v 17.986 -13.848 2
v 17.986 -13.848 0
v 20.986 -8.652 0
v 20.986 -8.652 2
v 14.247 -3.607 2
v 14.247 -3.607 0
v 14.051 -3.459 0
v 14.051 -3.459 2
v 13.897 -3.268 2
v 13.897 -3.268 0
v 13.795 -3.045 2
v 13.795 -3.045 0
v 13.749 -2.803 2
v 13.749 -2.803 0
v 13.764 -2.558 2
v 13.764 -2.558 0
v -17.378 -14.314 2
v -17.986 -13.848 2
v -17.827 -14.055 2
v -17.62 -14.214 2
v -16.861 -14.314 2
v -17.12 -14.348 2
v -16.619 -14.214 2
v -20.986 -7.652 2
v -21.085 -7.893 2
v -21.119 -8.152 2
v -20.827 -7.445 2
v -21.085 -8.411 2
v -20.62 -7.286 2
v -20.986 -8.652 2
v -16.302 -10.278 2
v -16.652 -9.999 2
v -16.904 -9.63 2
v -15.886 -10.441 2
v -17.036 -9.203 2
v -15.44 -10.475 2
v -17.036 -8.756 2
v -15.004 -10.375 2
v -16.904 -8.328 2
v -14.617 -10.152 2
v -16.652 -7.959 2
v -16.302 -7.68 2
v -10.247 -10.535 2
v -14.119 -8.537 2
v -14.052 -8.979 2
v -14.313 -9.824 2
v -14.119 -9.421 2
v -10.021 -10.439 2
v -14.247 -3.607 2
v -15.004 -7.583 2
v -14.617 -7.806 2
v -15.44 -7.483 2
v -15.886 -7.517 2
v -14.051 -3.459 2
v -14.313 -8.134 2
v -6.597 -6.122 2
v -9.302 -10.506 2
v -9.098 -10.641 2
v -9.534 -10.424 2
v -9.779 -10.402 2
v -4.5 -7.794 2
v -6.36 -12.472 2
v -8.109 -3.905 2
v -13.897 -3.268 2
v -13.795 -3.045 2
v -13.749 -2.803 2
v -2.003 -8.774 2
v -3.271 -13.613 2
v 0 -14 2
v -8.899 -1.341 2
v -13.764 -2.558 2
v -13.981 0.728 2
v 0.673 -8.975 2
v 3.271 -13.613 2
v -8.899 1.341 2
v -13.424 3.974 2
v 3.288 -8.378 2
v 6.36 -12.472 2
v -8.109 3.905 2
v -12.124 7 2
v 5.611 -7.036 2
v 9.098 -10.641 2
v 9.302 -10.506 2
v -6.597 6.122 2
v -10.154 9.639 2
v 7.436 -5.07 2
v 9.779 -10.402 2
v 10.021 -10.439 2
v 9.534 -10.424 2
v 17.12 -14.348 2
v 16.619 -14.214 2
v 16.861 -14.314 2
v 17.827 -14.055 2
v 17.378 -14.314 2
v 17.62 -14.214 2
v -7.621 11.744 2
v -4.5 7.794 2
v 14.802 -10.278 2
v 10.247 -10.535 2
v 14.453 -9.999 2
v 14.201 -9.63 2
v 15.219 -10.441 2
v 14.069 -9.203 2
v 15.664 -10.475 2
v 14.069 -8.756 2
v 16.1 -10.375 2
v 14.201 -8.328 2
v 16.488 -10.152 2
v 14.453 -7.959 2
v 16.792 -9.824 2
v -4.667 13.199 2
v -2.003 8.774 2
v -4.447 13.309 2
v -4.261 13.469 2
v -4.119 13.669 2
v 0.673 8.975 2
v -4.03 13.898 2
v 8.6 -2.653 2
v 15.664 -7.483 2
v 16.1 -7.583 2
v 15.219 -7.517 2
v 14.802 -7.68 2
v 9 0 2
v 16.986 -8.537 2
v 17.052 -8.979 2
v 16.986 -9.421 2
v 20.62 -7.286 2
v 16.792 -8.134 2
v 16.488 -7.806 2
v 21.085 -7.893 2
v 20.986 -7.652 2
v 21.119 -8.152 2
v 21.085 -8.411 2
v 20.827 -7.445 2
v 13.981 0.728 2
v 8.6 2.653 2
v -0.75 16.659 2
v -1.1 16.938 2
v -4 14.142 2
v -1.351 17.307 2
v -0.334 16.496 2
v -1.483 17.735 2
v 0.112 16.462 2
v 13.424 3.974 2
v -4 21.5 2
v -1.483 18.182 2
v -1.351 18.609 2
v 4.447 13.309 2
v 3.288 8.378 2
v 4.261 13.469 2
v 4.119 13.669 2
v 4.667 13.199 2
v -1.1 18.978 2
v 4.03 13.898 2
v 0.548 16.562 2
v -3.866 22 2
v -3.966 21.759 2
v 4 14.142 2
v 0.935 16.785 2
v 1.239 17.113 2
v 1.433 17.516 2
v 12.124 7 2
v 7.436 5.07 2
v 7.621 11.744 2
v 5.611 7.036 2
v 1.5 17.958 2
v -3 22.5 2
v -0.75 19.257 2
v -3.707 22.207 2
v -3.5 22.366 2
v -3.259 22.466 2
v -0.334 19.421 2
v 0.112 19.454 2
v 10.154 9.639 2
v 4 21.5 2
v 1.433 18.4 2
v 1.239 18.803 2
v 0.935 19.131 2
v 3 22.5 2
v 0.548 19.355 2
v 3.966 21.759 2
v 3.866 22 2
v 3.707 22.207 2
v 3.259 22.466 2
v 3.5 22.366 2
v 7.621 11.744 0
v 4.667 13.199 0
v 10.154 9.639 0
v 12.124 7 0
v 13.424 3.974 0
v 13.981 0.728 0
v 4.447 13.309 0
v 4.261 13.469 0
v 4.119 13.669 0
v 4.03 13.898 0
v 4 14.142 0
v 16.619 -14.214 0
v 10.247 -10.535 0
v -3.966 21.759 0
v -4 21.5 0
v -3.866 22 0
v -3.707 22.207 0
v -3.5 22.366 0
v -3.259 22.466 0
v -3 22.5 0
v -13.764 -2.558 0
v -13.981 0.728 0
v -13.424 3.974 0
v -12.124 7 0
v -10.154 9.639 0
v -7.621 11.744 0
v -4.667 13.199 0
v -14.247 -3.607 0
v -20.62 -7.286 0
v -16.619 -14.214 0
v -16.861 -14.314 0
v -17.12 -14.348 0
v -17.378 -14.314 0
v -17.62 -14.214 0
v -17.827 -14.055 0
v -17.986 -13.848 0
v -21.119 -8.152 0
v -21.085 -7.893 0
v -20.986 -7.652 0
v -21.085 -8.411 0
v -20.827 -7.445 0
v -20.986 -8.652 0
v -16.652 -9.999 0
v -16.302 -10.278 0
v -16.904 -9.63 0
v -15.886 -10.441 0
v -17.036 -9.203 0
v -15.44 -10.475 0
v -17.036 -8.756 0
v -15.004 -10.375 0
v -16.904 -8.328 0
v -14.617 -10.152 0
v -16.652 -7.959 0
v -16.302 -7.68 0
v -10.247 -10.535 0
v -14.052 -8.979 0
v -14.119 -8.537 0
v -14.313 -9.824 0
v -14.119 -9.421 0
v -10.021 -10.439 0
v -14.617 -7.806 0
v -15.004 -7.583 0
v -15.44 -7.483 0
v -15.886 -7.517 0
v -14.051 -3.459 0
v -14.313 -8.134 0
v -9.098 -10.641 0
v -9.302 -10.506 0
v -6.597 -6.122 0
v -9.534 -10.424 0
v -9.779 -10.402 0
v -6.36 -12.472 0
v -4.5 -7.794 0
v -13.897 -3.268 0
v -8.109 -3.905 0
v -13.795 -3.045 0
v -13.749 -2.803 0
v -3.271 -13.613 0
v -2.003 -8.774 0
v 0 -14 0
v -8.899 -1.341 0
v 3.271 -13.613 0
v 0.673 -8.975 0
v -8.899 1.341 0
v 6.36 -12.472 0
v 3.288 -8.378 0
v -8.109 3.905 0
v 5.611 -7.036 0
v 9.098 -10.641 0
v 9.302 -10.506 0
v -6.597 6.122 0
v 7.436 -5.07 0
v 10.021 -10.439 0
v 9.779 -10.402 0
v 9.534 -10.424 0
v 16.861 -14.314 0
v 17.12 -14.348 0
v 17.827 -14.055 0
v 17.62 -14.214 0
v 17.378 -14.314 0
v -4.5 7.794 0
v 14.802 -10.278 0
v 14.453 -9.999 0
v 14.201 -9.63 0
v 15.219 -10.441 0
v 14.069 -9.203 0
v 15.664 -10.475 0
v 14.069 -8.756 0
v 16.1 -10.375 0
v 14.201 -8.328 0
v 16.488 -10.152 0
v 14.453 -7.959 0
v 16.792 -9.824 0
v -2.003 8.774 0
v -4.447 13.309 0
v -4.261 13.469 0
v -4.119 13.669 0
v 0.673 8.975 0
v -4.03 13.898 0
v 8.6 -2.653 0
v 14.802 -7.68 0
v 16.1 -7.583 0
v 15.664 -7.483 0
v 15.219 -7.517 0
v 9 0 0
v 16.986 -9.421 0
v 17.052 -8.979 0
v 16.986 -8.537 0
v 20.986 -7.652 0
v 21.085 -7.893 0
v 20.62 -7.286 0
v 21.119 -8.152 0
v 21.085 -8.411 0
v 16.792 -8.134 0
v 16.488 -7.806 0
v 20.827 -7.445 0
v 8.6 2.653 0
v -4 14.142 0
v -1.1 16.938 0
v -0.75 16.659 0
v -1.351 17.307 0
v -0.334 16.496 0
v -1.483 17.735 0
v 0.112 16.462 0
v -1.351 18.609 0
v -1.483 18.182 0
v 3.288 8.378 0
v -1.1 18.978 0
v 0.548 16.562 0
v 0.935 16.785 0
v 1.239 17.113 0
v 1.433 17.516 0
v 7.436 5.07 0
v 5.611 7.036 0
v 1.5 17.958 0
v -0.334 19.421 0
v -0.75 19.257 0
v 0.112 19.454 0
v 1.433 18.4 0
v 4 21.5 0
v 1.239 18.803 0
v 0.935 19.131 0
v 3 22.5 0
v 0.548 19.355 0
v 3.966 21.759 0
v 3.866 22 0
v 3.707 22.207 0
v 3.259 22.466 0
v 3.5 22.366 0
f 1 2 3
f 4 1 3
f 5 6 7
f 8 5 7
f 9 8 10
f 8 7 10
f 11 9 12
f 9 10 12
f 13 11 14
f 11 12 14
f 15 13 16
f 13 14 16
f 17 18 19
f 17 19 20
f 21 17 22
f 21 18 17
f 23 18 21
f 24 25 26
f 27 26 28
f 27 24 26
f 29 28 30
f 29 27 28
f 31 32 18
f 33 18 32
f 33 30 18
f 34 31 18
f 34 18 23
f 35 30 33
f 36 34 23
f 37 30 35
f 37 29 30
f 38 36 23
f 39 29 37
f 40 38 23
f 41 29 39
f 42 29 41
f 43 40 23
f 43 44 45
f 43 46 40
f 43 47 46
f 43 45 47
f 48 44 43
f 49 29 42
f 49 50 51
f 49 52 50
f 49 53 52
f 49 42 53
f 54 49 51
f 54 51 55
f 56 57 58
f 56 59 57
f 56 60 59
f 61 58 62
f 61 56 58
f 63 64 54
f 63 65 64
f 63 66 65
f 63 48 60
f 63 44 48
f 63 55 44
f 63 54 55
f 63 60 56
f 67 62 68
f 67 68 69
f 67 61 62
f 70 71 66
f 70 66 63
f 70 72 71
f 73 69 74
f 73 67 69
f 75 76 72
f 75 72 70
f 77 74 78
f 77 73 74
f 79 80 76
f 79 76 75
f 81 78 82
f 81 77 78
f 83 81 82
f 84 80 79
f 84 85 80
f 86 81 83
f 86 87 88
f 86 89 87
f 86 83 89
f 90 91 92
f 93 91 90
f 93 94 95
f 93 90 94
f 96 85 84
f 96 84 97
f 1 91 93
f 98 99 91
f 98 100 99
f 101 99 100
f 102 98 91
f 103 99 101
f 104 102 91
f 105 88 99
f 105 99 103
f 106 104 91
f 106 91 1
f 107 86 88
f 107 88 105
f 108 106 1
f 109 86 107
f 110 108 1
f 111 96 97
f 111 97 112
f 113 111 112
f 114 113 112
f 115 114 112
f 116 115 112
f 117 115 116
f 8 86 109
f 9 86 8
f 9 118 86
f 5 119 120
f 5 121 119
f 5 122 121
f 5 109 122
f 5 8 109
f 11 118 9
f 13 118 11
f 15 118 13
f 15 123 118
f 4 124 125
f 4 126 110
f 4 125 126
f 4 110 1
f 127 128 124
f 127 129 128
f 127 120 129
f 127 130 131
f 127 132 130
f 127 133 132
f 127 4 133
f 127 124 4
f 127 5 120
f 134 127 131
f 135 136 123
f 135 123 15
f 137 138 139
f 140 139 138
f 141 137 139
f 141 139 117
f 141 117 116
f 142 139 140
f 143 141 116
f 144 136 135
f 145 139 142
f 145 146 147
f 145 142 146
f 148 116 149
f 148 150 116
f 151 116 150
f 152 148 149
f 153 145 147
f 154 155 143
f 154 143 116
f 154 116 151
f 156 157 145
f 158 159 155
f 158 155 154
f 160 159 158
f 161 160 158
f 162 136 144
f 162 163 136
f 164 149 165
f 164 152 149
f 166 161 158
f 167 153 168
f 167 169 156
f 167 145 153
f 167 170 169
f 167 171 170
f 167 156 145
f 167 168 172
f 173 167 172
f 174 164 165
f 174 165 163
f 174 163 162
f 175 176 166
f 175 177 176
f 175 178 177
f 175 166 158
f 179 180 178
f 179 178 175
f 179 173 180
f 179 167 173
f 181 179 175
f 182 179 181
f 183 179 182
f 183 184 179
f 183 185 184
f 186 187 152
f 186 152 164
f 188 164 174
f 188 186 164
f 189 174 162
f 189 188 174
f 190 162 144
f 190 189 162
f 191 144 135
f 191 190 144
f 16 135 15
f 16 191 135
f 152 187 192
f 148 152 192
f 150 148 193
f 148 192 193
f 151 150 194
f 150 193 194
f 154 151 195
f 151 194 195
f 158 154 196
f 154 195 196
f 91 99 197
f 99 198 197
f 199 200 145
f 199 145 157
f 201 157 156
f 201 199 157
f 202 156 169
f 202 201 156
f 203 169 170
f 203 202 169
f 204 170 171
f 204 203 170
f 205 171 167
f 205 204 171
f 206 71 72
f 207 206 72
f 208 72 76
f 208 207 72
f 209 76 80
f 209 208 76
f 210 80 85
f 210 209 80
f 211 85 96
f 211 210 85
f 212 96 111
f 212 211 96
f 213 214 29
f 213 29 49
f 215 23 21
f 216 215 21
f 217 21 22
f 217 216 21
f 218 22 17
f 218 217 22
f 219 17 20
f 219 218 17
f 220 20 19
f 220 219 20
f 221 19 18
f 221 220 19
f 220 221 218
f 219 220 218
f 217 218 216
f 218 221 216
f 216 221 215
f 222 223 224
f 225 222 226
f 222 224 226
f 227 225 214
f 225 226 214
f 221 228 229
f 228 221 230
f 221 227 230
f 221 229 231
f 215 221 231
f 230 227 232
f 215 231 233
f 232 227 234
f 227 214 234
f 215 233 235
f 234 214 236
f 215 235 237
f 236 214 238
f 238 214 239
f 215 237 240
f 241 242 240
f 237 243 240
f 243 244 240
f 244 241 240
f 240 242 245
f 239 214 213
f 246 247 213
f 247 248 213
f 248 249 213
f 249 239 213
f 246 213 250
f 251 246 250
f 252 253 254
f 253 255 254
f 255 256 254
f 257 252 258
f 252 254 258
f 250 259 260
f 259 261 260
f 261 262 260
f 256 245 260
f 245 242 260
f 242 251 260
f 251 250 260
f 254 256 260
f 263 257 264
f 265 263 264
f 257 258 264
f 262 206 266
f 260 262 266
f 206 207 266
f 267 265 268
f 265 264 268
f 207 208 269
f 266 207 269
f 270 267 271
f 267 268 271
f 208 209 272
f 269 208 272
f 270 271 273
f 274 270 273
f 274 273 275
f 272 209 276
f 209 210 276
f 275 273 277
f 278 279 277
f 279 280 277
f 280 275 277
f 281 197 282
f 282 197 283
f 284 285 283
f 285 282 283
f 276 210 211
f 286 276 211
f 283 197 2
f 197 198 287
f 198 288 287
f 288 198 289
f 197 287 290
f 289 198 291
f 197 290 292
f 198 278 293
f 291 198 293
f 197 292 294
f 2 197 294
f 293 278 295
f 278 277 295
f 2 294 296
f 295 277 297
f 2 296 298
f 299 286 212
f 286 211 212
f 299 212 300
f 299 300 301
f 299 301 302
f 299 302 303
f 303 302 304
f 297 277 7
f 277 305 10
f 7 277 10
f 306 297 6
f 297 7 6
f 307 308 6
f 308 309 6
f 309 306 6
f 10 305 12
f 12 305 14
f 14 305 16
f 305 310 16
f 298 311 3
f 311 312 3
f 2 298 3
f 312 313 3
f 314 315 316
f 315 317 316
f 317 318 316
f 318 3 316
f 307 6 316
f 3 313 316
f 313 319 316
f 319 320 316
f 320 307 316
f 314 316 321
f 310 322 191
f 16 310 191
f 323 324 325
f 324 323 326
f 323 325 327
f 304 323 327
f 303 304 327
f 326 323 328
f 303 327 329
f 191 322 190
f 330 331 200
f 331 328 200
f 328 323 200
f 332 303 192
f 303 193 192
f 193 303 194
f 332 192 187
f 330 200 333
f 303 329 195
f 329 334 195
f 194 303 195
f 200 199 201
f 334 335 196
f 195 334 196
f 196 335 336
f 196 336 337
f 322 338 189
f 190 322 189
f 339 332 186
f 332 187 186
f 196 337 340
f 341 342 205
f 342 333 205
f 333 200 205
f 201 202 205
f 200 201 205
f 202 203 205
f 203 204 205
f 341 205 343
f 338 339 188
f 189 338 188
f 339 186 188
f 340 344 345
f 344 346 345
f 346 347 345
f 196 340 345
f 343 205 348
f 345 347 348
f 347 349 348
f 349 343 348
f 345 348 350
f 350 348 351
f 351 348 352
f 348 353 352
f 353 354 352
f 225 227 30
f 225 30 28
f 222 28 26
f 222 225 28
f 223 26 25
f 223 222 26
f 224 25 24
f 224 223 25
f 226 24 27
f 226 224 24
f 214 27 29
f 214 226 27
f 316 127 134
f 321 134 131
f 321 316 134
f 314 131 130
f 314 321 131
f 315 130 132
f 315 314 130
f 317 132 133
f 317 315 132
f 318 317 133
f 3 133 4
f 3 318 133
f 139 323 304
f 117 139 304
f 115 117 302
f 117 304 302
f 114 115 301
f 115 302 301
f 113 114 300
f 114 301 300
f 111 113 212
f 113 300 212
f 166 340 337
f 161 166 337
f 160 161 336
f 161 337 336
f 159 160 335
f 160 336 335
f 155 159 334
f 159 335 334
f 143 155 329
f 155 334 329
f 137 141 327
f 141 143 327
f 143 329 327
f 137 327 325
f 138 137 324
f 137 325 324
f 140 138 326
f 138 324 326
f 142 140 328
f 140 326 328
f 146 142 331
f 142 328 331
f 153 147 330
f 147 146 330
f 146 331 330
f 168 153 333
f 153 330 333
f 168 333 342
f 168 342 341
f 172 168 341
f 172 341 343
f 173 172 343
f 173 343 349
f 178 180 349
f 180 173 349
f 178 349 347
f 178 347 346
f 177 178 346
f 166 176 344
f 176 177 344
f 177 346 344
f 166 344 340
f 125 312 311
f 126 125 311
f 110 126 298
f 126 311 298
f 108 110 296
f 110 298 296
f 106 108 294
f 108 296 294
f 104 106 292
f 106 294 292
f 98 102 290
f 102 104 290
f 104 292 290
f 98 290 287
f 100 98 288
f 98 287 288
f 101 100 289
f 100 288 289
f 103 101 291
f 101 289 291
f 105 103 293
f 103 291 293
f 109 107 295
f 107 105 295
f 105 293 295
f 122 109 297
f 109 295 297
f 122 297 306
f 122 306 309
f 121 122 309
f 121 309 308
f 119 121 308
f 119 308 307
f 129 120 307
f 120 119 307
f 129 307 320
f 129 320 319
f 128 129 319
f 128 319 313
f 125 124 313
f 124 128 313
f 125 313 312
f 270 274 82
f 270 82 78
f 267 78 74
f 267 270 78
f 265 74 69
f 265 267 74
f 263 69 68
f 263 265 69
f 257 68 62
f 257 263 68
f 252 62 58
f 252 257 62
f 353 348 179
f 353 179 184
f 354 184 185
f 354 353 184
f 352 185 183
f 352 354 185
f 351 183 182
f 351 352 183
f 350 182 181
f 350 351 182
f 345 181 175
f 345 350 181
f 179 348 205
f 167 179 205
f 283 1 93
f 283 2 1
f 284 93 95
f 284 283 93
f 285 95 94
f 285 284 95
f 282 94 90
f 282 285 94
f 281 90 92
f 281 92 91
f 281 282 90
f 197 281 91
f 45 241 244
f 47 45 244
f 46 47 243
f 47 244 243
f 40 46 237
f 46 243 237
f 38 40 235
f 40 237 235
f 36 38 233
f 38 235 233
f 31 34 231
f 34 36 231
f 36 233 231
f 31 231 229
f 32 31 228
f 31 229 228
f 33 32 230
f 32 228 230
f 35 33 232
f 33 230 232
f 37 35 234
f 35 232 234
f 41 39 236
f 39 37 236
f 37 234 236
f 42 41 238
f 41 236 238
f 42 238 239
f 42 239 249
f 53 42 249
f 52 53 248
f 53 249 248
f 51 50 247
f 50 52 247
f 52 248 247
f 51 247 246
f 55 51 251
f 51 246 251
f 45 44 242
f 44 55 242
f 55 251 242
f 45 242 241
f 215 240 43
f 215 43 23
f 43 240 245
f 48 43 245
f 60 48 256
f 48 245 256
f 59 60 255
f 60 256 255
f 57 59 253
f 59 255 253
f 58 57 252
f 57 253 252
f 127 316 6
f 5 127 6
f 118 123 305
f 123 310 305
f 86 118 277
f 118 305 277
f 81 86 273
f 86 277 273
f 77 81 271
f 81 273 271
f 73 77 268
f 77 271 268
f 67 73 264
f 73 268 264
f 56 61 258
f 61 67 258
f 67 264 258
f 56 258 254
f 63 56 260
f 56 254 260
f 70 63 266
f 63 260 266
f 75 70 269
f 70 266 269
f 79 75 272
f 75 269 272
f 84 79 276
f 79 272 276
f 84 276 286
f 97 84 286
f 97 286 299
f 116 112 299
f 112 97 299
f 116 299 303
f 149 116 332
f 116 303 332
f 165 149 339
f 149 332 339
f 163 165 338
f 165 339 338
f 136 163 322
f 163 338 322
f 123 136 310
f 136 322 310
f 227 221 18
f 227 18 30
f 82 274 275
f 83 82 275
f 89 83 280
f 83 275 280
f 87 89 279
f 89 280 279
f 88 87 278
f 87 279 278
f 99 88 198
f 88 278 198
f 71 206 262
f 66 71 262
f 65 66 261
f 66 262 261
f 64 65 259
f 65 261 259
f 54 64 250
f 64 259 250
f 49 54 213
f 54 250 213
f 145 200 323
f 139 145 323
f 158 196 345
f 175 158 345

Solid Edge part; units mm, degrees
sketch "Sketch1" plane through (0, 0, 0) normal (0, 0, 1) x (1, 0, 0)
  circle A0 centre (0, 0) radius 9
  line L0 (3, 22.5) -> (-3, 22.5)
  arc A1 (-4, 21.5) -> (-3, 22.5) centre (-3, 21.5) cw
  line L1 (-4, 21.5) -> (-4, 14.1421)
  arc A2 (-4.6667, 13.1993) -> (-4, 14.1421) centre (-5, 14.1421) ccw
  arc A3 (-13.7643, -2.5582) -> (-4.6667, 13.1993) centre (0, 0) cw
  arc A4 (-14.2474, -3.607) -> (-13.7643, -2.5582) centre (-14.7474, -2.7409) ccw
  line L2 (-20.6195, -7.2859) -> (-14.2474, -3.607)
  arc A5 (-20.6195, -7.2859) -> (-20.9856, -8.6519) centre (-20.1195, -8.1519) ccw
  line L3 (-17.9856, -13.8481) -> (-20.9856, -8.6519)
  arc A6 (-17.9856, -13.8481) -> (-16.6195, -14.2141) centre (-17.1195, -13.3481) ccw
  line L4 (-10.2474, -10.5352) -> (-16.6195, -14.2141)
  arc A7 (-9.0976, -10.6411) -> (-10.2474, -10.5352) centre (-9.7474, -11.4012) ccw
  arc A8 (10.2474, -10.5352) -> (9.0976, -10.6411) centre (9.7474, -11.4012) ccw
  line L5 (10.2474, -10.5352) -> (16.6195, -14.2141)
  arc A9 (17.9856, -13.8481) -> (16.6195, -14.2141) centre (17.1195, -13.3481) cw
  line L6 (17.9856, -13.8481) -> (20.9856, -8.6519)
  arc A10 (20.6195, -7.2859) -> (20.9856, -8.6519) centre (20.1195, -8.1519) cw
  line L7 (20.6195, -7.2859) -> (14.2474, -3.607)
  arc A11 (13.7643, -2.5582) -> (14.2474, -3.607) centre (14.7474, -2.7409) ccw
  arc A12 (4.6667, 13.1993) -> (13.7643, -2.5582) centre (0, 0) cw
  arc A13 (4, 14.1421) -> (4.6667, 13.1993) centre (5, 14.1421) ccw
  line L8 (4, 14.1421) -> (4, 21.5)
  arc A14 (3, 22.5) -> (4, 21.5) centre (3, 21.5) cw
  arc A15 (-9.0976, -10.6411) -> (9.0976, -10.6411) centre (0, 0) ccw
  circle A16 centre (0, 17.9582) radius 1.5
  circle A17 centre (-15.5523, -8.9791) radius 1.5
  circle A18 centre (15.5523, -8.9791) radius 1.5
extrude "Protrusion1" add sketch "Sketch1" along normal blind 2
